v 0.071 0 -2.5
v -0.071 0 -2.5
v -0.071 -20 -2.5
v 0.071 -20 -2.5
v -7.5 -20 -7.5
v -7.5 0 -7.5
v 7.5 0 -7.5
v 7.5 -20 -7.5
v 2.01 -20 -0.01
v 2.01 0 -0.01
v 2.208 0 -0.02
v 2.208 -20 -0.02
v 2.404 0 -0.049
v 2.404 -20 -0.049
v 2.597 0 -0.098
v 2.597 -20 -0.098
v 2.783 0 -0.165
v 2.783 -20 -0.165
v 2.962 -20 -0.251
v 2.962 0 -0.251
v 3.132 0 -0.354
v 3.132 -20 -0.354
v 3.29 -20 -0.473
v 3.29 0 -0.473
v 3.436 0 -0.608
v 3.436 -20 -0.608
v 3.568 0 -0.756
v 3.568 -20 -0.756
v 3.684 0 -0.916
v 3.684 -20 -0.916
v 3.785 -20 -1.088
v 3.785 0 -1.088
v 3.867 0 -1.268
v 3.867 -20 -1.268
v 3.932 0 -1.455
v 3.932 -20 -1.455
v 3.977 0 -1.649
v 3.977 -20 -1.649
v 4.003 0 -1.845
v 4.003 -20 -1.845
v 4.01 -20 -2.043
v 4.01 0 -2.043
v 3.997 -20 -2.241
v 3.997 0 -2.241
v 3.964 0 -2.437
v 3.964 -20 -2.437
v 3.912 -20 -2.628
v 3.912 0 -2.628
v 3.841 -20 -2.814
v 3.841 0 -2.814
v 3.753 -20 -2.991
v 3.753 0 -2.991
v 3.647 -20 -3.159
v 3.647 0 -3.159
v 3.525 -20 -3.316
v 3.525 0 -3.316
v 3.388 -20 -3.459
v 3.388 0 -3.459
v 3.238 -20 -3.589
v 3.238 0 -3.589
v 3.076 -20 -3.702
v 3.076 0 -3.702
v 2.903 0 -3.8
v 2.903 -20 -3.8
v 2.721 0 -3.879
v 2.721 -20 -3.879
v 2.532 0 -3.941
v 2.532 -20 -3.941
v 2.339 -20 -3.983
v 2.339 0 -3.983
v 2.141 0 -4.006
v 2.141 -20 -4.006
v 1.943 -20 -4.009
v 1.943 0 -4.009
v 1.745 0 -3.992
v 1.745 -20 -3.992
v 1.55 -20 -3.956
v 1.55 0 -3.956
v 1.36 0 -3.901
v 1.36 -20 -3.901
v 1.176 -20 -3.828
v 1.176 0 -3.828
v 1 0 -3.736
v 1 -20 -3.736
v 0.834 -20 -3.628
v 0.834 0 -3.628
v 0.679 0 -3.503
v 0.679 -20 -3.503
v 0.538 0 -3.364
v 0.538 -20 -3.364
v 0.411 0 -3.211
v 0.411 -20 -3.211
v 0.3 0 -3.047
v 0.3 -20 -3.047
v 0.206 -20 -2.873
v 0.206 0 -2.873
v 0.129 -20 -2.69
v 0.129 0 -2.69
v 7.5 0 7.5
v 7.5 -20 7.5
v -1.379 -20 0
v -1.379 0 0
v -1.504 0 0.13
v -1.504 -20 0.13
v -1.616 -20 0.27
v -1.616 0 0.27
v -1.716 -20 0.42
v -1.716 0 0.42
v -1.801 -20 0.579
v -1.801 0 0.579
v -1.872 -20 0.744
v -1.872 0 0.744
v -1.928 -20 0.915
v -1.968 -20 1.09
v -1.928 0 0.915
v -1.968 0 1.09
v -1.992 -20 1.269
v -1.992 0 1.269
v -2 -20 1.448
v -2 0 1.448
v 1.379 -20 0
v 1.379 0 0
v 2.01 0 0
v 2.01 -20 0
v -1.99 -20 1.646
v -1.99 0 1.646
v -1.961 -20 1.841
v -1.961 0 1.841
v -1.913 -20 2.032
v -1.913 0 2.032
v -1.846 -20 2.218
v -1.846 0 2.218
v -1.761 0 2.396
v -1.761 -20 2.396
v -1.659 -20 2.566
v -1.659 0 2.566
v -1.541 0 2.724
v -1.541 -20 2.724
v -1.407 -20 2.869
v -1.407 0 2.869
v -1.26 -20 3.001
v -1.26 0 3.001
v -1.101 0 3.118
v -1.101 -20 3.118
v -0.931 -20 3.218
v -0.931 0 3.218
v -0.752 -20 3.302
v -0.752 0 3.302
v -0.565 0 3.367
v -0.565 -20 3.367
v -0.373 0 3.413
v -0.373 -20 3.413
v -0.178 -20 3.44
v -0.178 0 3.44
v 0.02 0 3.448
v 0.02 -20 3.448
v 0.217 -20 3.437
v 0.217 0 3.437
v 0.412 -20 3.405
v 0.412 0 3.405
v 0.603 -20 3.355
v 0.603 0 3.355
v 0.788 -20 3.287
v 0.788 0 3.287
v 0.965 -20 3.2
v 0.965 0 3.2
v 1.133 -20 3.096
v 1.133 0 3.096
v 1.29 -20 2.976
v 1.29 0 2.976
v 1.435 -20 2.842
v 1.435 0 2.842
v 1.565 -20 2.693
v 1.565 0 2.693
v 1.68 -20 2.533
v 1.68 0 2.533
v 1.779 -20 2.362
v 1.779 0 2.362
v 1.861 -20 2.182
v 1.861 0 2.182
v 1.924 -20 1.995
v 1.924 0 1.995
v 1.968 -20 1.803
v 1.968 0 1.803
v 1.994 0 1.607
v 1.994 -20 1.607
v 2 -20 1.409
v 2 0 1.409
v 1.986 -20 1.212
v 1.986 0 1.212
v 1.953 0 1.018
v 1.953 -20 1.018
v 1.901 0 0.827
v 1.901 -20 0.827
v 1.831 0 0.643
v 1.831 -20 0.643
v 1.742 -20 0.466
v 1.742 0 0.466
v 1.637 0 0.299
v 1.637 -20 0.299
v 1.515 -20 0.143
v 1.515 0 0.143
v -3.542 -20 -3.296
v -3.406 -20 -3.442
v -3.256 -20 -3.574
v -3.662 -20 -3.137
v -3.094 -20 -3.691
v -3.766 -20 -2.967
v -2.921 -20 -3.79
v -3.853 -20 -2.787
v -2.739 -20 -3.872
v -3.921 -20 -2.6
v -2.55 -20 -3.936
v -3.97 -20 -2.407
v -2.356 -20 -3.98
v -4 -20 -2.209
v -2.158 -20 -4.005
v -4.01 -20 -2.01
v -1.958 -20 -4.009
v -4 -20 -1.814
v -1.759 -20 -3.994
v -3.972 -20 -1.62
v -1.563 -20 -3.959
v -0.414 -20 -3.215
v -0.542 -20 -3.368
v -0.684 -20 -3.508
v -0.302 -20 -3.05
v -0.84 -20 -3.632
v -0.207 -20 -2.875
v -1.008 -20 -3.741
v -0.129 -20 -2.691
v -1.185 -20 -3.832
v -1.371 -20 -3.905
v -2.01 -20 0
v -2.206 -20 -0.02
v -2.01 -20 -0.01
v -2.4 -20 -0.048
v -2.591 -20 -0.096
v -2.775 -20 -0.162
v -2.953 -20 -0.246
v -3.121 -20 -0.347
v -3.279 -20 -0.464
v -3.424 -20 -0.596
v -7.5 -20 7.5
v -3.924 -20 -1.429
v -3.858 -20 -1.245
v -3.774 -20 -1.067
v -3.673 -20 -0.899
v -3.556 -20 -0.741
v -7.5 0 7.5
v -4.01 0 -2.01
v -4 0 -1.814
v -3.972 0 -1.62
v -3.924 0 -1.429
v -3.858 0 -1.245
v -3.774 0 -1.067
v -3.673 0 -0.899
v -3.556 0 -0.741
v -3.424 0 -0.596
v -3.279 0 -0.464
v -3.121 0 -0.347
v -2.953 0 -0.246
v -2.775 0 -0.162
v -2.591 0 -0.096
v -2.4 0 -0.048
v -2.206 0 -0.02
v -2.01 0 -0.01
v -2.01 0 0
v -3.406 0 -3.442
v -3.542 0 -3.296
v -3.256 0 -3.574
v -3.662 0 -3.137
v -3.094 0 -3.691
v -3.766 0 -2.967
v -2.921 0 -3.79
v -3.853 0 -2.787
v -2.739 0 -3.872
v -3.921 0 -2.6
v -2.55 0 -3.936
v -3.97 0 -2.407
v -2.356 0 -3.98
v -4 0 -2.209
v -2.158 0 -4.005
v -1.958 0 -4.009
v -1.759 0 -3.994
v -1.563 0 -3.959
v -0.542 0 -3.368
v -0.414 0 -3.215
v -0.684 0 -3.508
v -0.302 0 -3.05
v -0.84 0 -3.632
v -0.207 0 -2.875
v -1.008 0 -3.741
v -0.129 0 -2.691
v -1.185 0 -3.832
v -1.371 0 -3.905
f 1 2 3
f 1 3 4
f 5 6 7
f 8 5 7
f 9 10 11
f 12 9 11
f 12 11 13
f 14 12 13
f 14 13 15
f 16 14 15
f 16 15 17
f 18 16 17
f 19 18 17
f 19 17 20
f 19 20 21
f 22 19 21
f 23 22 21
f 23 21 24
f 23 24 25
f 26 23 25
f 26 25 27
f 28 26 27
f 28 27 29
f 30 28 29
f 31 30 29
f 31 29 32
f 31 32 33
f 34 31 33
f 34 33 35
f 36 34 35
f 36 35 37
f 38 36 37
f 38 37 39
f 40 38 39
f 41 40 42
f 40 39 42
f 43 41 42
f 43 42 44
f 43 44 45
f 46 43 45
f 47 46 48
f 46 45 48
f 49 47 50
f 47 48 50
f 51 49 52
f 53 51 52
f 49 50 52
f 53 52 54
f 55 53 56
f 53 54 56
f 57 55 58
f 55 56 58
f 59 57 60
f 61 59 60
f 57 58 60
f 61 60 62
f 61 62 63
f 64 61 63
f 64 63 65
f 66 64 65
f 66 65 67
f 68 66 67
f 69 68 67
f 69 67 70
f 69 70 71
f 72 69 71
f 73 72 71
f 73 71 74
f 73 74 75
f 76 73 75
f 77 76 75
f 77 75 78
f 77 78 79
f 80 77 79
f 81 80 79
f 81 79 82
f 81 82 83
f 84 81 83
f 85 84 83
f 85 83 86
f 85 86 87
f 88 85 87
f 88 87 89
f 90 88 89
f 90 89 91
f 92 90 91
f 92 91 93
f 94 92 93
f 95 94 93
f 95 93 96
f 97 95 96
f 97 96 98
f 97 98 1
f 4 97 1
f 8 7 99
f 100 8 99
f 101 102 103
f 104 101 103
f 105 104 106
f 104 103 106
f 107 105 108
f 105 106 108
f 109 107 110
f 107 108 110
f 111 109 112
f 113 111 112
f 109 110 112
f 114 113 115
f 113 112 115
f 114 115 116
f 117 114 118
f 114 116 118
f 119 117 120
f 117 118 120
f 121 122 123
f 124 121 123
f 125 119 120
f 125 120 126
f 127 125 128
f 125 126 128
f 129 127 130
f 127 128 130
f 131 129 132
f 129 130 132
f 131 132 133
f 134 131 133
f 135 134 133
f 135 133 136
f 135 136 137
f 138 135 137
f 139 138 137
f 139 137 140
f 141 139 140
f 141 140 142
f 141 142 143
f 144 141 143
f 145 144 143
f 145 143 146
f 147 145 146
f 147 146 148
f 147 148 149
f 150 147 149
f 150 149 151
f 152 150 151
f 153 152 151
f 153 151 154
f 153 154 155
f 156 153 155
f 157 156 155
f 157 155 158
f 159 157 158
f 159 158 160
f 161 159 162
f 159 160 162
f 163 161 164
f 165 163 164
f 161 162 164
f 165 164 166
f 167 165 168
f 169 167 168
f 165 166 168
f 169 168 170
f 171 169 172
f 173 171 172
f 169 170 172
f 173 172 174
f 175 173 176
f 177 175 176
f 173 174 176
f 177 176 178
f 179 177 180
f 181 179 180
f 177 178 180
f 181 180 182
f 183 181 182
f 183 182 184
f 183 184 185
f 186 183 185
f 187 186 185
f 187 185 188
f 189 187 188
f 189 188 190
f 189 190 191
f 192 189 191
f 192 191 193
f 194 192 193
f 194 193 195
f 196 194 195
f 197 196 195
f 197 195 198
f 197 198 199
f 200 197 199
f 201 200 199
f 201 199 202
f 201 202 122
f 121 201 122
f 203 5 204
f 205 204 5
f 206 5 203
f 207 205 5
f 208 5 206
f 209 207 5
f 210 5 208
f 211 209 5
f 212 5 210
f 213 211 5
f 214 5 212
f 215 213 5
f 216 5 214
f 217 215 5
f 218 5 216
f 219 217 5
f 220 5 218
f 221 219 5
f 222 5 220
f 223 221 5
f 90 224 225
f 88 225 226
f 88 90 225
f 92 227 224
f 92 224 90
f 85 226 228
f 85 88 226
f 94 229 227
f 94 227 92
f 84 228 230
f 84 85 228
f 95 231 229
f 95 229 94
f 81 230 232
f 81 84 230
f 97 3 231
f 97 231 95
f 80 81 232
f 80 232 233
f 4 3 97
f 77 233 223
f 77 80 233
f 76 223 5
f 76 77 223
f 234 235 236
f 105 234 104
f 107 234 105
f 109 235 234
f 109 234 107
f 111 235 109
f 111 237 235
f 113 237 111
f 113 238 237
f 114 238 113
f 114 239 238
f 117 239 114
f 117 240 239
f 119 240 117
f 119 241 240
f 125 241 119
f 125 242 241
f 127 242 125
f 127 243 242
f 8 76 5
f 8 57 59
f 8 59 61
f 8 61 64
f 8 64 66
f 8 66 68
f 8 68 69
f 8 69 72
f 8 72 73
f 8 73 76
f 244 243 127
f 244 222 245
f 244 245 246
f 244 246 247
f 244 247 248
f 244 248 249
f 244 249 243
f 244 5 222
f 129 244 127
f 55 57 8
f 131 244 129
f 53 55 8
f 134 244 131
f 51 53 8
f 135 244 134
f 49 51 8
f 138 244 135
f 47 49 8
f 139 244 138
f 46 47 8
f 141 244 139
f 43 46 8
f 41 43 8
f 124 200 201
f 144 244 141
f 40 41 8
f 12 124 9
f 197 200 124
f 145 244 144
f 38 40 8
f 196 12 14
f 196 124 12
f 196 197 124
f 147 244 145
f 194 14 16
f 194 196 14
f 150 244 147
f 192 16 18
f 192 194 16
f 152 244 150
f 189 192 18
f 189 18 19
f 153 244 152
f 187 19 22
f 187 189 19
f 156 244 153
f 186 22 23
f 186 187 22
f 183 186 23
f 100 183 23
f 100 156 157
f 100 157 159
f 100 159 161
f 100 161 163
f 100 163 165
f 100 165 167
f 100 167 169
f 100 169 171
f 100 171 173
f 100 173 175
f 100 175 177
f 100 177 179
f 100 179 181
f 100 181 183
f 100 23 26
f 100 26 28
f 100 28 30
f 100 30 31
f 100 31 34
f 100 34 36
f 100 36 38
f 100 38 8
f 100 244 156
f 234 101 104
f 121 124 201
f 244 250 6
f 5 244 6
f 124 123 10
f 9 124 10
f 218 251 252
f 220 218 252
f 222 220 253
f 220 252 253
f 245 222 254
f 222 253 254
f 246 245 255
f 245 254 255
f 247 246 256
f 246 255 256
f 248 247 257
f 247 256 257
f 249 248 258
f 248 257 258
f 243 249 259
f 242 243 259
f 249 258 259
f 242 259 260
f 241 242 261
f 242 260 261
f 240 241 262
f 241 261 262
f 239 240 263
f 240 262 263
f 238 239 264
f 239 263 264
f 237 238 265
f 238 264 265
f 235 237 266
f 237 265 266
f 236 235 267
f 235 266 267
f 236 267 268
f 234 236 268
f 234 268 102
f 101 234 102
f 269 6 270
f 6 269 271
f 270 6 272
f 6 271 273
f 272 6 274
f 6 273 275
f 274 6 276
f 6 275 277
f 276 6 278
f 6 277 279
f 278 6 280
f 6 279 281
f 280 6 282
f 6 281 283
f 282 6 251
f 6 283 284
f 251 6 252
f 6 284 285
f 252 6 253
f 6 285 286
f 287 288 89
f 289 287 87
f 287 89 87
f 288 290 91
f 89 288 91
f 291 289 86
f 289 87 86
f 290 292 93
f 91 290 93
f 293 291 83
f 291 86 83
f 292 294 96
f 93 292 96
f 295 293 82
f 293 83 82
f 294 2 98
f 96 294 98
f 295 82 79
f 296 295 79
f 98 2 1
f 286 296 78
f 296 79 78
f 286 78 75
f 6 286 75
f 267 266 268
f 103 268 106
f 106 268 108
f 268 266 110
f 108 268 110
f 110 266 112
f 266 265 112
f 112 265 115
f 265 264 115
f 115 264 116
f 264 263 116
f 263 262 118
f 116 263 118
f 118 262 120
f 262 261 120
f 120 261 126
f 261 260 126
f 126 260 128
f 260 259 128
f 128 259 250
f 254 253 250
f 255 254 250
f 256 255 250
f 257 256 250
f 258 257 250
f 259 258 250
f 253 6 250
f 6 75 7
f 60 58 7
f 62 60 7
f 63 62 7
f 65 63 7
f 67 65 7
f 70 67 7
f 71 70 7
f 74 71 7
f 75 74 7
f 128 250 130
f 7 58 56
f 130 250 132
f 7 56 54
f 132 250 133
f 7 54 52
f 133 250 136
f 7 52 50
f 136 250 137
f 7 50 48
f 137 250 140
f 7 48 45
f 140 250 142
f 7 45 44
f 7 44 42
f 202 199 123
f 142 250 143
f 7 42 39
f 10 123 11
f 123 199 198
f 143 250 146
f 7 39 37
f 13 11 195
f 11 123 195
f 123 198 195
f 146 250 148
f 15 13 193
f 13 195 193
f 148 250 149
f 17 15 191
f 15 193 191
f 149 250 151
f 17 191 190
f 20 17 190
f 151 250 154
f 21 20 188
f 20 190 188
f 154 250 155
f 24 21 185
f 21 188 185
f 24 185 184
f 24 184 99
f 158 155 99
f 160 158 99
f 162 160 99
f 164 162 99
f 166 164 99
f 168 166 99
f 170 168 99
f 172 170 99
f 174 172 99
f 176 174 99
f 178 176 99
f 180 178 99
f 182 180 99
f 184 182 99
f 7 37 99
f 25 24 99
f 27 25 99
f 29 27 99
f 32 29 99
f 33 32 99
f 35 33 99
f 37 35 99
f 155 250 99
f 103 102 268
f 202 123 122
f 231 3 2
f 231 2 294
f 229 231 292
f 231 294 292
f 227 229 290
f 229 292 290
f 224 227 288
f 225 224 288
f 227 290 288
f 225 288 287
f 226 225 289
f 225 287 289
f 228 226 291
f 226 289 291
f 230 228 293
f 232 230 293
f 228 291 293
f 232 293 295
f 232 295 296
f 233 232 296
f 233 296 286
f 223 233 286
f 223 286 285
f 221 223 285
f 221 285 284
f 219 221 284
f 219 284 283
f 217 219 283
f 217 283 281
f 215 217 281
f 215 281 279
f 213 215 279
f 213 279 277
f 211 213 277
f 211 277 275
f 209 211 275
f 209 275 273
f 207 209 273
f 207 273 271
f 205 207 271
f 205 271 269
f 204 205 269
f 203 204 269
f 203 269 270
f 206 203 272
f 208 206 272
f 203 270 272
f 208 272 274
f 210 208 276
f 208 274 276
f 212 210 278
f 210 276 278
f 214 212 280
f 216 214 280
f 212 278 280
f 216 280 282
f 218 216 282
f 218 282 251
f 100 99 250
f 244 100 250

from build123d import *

# Parameters (mm, degrees)
F1_DEPTH = 20
F3_DEPTH = 20.001
F4_W     = 2.488287
F4_H     = 23.197157
F5_DEPTH = 2.5


with BuildPart() as f1:
    # F0 (on Front) → F1 (new body)
    with BuildSketch(Plane.XZ):
        Polygon((-7.5, -7.5), (7.5, -7.5), (7.5, 7.5), (2, 7.5), (0, 7.5), (-7.5, 7.5), align=None)
    extrude(amount=F1_DEPTH)

    # F2 (on face) → F3 (cut, through all)
    with BuildSketch(Plane(origin=(0, 0, 0), x_dir=(-1, 0, 0), z_dir=(0, 1, 0))):
        with BuildLine():
            Line((-1.379276, 0), (0, 0))
            Line((0, 0), (1.379276, 0))
            ThreePointArc((1.379276, 0), (1.838281, 0.660448), (2, 1.448309))
            ThreePointArc((2, 1.448309), (-0.787861, 3.286589), (-1.379276, 0))
        make_face()
        with BuildLine():
            Line((1.379276, 0), (0, 0))
            Line((0, 0), (-1.379276, 0))
            ThreePointArc((-1.379276, 0), (-1.20038, -0.151406), (-1.005, -0.280846))
            ThreePointArc((-1.005, -0.280846), (0, -0.551691), (1.005, -0.280846))
            ThreePointArc((1.005, -0.280846), (1.20038, -0.151406), (1.379276, 0))
        make_face()
        with BuildLine():
            Line((2.01, 0), (1.379276, 0))
            ThreePointArc((1.379276, 0), (1.20038, -0.151406), (1.005, -0.280846))
            ThreePointArc((1.005, -0.280846), (1.489572, -0.078898), (2.01, -0.01))
            Line((2.01, -0.01), (2.01, 0))
        make_face()
        with BuildLine():
            ThreePointArc((-1.005, -0.280846), (-1.20038, -0.151406), (-1.379276, 0))
            Line((-1.379276, 0), (-2.01, 0))
            Line((-2.01, 0), (-2.01, -0.01))
            ThreePointArc((-2.01, -0.01), (-1.489572, -0.078898), (-1.005, -0.280846))
        make_face()
        with BuildLine():
            ThreePointArc((2.01, -0.01), (1.489572, -0.078898), (1.005, -0.280846))
            ThreePointArc((1.005, -0.280846), (1.012503, -3.743494), (4.01, -2.01))
            ThreePointArc((4.01, -2.01), (3.424214, -0.595786), (2.01, -0.01))
        make_face()
        with BuildLine():
            ThreePointArc((-0.01, -2.01), (-0.276506, -1.012503), (-1.005, -0.280846))
            ThreePointArc((-1.005, -0.280846), (-1.489572, -0.078898), (-2.01, -0.01))
            ThreePointArc((-2.01, -0.01), (-3.424214, -3.424214), (-0.01, -2.01))
        make_face()
    extrude(amount=-F3_DEPTH, mode=Mode.SUBTRACT)

    # F4 (on Top) → F5 (cut)
    with BuildSketch(Plane.XY):
        with Locations((0.051259, -9.1946)):
            Rectangle(F4_W, F4_H)
    extrude(amount=-F5_DEPTH, mode=Mode.SUBTRACT)


solid = f1.part
